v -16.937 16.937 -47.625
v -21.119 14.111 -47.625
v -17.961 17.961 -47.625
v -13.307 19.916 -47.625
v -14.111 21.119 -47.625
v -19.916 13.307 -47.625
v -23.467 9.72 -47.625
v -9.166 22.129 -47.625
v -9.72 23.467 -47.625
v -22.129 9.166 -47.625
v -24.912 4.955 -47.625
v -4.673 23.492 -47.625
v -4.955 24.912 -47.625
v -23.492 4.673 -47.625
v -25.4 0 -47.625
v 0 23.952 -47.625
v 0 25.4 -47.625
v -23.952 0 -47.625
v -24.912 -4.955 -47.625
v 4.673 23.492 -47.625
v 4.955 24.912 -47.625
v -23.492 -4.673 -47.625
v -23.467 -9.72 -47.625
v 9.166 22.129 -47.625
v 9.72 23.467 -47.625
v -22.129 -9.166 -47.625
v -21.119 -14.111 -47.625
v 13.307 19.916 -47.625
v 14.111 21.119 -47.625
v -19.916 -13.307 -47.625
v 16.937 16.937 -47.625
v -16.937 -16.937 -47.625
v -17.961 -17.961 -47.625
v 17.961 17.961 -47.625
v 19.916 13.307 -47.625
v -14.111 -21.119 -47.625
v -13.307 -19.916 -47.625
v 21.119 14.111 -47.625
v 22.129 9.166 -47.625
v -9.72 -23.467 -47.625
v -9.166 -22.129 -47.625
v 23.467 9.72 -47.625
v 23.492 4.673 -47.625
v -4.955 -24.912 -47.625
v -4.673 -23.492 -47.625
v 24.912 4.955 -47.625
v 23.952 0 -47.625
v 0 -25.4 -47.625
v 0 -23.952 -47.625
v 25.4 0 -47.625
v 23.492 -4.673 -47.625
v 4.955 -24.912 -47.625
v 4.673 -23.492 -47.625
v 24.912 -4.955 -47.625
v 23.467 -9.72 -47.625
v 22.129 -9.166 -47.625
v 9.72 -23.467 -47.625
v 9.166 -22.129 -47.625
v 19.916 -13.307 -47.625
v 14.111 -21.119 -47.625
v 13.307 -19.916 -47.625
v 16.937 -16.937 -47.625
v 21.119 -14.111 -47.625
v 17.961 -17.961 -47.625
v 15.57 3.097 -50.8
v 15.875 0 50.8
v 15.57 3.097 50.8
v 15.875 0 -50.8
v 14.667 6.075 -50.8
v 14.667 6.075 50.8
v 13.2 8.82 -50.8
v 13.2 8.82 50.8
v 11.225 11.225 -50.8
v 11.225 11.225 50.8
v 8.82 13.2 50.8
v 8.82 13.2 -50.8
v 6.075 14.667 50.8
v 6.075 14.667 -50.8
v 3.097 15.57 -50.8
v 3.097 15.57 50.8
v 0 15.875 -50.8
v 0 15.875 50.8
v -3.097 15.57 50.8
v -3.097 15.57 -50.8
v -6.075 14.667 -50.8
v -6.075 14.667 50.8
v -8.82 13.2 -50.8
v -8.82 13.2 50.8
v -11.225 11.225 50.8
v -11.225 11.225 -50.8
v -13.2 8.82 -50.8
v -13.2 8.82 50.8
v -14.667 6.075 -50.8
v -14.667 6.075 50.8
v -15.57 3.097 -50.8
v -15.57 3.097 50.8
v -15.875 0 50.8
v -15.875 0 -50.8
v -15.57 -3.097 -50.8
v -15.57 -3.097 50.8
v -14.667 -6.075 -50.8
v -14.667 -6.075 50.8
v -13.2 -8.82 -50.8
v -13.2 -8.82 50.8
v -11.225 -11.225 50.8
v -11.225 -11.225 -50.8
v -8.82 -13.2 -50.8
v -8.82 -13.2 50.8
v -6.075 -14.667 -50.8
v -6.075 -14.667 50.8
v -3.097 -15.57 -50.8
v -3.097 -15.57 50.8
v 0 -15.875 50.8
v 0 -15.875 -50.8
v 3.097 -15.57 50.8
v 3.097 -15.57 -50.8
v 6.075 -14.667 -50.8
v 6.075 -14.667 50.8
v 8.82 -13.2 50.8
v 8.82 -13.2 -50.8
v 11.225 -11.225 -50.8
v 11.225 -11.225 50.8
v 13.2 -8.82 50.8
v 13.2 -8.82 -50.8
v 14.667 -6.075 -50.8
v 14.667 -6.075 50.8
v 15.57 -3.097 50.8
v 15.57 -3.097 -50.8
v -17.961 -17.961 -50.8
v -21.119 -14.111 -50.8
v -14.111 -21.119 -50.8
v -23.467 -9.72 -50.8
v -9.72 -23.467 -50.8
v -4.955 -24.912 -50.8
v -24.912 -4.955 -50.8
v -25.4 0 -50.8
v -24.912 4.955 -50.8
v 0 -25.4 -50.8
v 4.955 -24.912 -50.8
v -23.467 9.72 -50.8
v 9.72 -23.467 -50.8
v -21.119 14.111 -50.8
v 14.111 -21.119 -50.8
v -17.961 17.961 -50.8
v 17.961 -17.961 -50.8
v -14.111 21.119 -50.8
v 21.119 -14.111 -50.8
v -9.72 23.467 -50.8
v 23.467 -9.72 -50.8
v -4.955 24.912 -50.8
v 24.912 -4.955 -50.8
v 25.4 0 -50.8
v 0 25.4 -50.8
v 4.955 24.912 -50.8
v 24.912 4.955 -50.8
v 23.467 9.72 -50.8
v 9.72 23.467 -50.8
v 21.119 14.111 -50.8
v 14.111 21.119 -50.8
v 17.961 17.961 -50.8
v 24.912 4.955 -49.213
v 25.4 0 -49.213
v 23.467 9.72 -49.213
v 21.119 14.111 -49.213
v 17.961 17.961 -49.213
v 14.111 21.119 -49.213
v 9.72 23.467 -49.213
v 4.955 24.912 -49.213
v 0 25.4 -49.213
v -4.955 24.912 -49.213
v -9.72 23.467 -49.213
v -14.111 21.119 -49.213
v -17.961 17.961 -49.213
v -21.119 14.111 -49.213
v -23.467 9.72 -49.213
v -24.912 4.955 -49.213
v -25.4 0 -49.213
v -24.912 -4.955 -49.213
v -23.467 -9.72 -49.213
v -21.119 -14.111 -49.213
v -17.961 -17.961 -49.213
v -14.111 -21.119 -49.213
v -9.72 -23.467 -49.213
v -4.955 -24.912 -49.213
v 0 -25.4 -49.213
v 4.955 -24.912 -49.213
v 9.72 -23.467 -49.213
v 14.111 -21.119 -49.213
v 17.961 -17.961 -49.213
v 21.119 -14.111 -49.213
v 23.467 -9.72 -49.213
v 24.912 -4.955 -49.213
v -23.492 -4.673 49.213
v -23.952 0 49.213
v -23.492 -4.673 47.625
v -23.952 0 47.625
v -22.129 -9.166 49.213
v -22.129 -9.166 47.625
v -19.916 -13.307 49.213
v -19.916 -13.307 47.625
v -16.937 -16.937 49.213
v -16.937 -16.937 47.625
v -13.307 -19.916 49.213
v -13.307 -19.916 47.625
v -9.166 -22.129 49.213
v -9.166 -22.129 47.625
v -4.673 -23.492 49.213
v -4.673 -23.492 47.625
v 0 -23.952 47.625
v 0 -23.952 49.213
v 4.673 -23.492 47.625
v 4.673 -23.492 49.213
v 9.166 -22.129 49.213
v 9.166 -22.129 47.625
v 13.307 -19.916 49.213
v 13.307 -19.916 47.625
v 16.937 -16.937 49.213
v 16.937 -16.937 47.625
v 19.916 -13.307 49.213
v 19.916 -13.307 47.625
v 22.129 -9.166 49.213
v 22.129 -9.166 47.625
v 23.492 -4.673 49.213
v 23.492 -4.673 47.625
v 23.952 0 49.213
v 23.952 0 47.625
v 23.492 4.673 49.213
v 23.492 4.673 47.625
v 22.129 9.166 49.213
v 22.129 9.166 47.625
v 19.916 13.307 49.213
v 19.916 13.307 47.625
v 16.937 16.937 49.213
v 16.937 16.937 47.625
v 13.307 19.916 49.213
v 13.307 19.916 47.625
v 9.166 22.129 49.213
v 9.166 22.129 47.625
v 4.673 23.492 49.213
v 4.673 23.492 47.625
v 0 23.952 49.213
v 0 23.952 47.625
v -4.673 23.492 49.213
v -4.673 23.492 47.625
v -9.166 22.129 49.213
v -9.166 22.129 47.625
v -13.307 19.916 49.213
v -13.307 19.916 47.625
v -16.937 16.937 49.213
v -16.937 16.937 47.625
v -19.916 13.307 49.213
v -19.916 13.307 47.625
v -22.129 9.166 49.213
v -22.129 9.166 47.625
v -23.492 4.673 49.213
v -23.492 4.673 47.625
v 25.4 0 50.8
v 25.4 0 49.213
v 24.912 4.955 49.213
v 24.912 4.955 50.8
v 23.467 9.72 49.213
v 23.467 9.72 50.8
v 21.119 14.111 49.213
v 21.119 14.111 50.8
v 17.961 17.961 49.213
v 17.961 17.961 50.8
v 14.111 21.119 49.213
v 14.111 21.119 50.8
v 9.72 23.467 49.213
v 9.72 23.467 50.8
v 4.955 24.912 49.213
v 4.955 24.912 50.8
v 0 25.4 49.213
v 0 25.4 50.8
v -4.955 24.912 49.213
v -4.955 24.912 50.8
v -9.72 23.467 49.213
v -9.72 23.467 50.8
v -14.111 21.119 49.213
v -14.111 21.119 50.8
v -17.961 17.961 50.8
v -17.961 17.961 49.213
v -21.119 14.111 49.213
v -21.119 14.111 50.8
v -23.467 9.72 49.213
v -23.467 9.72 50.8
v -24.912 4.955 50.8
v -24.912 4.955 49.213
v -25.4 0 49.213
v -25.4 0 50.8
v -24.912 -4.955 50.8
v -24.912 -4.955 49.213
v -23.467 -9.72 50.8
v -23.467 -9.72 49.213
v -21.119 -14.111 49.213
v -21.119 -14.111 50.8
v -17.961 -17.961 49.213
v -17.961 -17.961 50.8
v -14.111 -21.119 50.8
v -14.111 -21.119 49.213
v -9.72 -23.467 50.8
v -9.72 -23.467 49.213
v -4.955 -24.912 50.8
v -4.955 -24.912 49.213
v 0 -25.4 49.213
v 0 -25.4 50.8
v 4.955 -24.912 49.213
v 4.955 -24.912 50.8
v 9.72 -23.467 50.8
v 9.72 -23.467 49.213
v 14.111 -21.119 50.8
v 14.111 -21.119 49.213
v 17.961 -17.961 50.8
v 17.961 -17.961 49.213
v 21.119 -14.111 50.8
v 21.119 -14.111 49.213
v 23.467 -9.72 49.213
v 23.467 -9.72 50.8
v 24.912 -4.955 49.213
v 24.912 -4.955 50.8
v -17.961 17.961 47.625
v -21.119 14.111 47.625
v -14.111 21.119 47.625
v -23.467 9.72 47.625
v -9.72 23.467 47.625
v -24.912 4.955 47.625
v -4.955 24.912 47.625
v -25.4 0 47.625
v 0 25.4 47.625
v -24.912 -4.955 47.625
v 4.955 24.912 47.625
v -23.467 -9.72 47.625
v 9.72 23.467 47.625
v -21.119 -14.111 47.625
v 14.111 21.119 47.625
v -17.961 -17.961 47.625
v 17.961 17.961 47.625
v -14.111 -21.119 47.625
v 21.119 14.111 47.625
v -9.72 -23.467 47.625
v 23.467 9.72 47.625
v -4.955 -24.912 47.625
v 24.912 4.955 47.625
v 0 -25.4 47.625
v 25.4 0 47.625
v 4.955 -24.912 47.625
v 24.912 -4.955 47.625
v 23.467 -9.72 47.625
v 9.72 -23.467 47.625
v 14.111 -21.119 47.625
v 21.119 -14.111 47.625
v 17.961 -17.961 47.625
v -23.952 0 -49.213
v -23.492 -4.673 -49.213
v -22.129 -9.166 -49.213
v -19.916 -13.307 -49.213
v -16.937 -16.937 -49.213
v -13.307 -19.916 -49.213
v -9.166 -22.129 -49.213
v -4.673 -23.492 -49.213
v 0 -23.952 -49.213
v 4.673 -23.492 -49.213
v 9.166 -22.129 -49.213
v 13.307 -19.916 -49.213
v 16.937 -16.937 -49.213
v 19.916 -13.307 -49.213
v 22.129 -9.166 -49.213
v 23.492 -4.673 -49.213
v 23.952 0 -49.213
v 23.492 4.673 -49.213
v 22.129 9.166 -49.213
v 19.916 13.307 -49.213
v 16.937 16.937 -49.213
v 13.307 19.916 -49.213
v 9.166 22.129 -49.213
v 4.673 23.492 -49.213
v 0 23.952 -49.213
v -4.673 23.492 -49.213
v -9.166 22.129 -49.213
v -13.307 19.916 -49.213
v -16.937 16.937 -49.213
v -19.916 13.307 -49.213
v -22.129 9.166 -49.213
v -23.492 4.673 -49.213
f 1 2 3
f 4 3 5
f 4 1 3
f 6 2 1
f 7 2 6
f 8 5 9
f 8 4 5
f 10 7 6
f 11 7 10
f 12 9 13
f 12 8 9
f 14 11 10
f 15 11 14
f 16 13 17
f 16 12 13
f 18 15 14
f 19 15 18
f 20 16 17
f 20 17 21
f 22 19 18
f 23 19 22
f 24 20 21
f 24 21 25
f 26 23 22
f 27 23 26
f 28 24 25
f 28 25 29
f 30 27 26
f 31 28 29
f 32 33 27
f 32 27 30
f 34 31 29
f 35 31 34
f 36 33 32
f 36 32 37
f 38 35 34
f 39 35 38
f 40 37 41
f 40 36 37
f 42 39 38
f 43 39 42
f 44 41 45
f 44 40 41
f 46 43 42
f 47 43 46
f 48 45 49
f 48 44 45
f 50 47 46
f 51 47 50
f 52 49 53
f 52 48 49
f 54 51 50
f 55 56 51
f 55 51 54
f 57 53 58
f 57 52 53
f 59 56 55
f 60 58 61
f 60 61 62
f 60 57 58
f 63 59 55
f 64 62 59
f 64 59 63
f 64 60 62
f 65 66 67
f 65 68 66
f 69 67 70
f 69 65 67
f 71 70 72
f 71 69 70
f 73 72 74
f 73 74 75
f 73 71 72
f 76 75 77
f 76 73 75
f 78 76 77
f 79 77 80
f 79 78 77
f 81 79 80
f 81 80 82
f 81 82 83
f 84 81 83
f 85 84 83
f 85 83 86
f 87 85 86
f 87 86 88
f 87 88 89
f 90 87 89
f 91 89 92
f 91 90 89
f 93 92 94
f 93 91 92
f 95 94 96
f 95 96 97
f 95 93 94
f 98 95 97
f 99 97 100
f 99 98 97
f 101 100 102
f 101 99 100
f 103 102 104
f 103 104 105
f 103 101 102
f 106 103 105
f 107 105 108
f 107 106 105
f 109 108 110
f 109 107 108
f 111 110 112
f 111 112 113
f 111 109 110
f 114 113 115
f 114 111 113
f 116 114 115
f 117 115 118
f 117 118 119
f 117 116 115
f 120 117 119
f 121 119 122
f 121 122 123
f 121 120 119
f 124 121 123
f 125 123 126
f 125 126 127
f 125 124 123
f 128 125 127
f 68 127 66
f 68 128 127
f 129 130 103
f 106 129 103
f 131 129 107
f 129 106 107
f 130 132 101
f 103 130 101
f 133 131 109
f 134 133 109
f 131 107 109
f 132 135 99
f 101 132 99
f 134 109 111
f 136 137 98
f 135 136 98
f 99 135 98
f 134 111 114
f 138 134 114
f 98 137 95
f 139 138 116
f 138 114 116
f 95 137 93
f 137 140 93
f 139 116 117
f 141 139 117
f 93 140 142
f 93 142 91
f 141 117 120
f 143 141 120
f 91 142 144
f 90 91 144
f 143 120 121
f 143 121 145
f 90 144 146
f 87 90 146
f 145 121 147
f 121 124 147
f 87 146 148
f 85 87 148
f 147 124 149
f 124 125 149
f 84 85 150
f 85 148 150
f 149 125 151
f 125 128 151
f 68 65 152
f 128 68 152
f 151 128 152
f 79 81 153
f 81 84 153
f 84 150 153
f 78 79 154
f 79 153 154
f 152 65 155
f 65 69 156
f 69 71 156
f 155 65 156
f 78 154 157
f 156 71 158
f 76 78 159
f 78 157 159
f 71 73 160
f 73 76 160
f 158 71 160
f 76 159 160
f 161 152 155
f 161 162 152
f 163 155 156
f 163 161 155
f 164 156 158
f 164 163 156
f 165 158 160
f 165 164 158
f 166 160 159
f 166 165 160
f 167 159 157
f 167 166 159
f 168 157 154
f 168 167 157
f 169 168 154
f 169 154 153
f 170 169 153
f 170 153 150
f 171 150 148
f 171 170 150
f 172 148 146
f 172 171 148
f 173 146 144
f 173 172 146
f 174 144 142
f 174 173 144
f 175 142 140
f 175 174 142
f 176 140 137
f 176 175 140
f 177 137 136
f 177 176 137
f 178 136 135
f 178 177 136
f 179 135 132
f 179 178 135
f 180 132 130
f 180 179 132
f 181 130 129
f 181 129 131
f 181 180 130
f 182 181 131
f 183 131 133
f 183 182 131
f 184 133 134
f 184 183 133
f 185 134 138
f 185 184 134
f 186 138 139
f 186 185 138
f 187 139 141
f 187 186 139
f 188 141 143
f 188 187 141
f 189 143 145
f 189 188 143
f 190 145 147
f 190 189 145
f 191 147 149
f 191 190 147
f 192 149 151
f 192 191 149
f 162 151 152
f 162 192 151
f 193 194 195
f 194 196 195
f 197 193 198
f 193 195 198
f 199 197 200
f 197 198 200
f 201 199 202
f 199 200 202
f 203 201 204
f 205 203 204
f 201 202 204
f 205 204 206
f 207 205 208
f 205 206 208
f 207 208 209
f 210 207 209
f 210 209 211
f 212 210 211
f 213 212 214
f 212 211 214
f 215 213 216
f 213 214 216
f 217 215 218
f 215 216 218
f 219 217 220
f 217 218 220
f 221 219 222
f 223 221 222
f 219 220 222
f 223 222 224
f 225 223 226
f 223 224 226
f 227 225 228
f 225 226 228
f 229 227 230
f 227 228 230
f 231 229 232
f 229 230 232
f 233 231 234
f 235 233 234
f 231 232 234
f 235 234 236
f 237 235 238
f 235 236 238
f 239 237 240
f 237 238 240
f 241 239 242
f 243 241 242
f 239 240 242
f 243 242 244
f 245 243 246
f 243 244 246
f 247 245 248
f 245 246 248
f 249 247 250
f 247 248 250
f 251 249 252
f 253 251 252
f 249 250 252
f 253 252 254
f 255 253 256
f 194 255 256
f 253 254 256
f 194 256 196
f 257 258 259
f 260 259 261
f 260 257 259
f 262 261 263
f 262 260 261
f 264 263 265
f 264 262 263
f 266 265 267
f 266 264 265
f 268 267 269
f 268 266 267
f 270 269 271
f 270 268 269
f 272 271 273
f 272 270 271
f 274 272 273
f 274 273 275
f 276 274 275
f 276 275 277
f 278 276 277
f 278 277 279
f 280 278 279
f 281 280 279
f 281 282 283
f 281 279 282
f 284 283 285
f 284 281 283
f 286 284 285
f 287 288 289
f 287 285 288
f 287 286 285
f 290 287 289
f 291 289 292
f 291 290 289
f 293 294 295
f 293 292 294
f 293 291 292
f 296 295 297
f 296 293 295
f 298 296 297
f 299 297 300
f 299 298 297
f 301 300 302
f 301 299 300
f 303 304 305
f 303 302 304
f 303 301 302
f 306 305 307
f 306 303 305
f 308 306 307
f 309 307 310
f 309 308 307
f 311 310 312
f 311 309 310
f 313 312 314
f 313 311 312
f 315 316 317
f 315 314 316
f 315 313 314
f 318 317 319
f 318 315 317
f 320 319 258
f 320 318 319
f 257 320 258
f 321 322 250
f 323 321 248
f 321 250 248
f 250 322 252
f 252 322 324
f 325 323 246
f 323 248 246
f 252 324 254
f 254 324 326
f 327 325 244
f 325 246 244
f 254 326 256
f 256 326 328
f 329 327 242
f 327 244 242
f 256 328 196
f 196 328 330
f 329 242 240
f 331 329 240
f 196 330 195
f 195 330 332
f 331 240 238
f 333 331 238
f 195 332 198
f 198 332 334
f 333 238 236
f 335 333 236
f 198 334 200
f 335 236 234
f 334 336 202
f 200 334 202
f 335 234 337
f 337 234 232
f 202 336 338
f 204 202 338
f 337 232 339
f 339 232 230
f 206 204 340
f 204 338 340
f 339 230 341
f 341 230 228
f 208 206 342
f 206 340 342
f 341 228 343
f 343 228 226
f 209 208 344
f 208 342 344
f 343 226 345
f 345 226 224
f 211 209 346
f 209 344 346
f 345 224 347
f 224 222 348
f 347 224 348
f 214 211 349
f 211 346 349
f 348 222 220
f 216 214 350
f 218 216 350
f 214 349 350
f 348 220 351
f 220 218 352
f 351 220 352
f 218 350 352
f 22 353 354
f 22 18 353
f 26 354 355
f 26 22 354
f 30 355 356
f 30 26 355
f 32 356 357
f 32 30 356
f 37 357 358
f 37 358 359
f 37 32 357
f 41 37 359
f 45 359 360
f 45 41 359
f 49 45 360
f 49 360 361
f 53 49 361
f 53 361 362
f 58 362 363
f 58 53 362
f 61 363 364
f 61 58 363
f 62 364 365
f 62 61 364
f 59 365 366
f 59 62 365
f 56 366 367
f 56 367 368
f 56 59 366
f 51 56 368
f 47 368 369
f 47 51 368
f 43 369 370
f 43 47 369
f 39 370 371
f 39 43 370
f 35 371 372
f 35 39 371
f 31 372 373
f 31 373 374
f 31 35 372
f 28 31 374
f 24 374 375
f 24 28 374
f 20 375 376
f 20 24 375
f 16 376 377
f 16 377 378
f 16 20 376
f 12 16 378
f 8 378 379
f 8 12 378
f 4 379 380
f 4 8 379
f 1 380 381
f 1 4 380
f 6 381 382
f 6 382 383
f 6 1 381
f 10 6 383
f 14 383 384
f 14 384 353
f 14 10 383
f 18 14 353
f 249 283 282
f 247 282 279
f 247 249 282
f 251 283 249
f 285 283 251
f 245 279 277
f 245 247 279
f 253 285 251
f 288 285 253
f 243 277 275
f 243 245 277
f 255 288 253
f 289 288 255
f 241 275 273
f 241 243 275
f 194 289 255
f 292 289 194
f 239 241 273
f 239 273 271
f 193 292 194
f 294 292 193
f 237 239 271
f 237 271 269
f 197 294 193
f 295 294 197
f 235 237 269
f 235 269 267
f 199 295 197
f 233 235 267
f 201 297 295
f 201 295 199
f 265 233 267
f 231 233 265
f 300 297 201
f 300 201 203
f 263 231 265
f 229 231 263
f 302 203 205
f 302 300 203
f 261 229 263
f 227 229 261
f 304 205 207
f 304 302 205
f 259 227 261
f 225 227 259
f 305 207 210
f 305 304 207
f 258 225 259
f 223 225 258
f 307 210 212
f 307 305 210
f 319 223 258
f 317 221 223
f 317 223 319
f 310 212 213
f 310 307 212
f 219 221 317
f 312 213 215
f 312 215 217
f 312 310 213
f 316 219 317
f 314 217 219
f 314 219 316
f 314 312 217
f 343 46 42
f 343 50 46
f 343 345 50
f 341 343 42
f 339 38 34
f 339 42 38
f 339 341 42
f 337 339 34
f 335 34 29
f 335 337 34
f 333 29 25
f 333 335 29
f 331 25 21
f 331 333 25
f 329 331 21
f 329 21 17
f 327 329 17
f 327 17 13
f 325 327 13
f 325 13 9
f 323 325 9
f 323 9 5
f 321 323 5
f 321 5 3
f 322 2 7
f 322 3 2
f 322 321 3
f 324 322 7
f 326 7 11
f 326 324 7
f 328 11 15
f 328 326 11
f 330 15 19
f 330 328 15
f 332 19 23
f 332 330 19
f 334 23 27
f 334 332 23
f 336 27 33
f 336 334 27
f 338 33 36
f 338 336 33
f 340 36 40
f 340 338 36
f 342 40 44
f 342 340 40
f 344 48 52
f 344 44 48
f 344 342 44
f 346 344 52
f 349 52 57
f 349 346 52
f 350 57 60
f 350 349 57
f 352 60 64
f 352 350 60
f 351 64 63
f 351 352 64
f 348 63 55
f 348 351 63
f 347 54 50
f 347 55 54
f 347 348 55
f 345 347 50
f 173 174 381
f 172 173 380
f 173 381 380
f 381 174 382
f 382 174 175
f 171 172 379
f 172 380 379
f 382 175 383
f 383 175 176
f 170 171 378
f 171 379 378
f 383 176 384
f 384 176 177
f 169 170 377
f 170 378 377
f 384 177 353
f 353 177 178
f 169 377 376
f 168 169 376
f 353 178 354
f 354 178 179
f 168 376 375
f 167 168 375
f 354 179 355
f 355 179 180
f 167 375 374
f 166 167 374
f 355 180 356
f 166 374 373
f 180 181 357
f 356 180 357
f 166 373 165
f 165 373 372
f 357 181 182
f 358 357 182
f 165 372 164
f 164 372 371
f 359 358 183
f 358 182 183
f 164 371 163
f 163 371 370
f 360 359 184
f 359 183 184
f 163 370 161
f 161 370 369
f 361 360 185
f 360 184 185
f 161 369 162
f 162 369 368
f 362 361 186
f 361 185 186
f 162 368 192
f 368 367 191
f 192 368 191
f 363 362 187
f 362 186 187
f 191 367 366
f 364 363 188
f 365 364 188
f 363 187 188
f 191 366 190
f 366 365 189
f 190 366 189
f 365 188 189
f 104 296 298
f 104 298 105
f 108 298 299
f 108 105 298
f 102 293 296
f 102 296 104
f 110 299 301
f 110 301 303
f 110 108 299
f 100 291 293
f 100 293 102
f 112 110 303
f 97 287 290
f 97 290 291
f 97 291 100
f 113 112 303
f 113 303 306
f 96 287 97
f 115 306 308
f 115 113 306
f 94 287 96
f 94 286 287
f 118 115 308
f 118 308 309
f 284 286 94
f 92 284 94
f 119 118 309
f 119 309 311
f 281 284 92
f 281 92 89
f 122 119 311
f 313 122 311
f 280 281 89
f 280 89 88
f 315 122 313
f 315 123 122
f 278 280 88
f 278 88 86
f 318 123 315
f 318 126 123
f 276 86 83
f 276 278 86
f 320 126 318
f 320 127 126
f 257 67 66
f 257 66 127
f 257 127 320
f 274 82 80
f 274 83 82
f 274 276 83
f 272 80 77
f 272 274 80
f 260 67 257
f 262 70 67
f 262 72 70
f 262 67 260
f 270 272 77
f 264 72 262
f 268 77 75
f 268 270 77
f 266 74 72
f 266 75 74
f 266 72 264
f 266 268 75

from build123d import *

# Parameters (mm, degrees)
SKETCH1_R           = 25.4
SKETCH1_R_2         = 15.875
BOSS_EXTRUDE1_DEPTH = 50.8
SKETCH2_W           = 1.5875
SKETCH2_H           = 1.4478


with BuildPart() as part:
    # Sketch1 → Boss-Extrude1 (new, symmetric)
    with BuildSketch(Plane.XY):
        Circle(SKETCH1_R)
        Circle(SKETCH1_R_2, mode=Mode.SUBTRACT)
    extrude(amount=BOSS_EXTRUDE1_DEPTH, both=True)

    # Sketch2 → Cut-Revolve1 (revolve, cut)
    with BuildSketch(Plane(origin=(0, 0, 0), x_dir=(0, 0, -1), z_dir=(1, 0, 0)), mode=Mode.PRIVATE) as cut_revolve1_sk:
        with Locations((-48.41875, 24.6761)):
            Rectangle(SKETCH2_W, SKETCH2_H)
    cut_revolve1 = revolve(cut_revolve1_sk.sketch.rotate(Axis((0, 0, 0), (0, 0, 1)), 90), axis=Axis((0, 0, 0), (0, 0, 1)), mode=Mode.SUBTRACT)

    # Mirror1: Cut-Revolve1 across plane
    add(cut_revolve1.mirror(Plane.XY), mode=Mode.SUBTRACT)


solid = part.part
